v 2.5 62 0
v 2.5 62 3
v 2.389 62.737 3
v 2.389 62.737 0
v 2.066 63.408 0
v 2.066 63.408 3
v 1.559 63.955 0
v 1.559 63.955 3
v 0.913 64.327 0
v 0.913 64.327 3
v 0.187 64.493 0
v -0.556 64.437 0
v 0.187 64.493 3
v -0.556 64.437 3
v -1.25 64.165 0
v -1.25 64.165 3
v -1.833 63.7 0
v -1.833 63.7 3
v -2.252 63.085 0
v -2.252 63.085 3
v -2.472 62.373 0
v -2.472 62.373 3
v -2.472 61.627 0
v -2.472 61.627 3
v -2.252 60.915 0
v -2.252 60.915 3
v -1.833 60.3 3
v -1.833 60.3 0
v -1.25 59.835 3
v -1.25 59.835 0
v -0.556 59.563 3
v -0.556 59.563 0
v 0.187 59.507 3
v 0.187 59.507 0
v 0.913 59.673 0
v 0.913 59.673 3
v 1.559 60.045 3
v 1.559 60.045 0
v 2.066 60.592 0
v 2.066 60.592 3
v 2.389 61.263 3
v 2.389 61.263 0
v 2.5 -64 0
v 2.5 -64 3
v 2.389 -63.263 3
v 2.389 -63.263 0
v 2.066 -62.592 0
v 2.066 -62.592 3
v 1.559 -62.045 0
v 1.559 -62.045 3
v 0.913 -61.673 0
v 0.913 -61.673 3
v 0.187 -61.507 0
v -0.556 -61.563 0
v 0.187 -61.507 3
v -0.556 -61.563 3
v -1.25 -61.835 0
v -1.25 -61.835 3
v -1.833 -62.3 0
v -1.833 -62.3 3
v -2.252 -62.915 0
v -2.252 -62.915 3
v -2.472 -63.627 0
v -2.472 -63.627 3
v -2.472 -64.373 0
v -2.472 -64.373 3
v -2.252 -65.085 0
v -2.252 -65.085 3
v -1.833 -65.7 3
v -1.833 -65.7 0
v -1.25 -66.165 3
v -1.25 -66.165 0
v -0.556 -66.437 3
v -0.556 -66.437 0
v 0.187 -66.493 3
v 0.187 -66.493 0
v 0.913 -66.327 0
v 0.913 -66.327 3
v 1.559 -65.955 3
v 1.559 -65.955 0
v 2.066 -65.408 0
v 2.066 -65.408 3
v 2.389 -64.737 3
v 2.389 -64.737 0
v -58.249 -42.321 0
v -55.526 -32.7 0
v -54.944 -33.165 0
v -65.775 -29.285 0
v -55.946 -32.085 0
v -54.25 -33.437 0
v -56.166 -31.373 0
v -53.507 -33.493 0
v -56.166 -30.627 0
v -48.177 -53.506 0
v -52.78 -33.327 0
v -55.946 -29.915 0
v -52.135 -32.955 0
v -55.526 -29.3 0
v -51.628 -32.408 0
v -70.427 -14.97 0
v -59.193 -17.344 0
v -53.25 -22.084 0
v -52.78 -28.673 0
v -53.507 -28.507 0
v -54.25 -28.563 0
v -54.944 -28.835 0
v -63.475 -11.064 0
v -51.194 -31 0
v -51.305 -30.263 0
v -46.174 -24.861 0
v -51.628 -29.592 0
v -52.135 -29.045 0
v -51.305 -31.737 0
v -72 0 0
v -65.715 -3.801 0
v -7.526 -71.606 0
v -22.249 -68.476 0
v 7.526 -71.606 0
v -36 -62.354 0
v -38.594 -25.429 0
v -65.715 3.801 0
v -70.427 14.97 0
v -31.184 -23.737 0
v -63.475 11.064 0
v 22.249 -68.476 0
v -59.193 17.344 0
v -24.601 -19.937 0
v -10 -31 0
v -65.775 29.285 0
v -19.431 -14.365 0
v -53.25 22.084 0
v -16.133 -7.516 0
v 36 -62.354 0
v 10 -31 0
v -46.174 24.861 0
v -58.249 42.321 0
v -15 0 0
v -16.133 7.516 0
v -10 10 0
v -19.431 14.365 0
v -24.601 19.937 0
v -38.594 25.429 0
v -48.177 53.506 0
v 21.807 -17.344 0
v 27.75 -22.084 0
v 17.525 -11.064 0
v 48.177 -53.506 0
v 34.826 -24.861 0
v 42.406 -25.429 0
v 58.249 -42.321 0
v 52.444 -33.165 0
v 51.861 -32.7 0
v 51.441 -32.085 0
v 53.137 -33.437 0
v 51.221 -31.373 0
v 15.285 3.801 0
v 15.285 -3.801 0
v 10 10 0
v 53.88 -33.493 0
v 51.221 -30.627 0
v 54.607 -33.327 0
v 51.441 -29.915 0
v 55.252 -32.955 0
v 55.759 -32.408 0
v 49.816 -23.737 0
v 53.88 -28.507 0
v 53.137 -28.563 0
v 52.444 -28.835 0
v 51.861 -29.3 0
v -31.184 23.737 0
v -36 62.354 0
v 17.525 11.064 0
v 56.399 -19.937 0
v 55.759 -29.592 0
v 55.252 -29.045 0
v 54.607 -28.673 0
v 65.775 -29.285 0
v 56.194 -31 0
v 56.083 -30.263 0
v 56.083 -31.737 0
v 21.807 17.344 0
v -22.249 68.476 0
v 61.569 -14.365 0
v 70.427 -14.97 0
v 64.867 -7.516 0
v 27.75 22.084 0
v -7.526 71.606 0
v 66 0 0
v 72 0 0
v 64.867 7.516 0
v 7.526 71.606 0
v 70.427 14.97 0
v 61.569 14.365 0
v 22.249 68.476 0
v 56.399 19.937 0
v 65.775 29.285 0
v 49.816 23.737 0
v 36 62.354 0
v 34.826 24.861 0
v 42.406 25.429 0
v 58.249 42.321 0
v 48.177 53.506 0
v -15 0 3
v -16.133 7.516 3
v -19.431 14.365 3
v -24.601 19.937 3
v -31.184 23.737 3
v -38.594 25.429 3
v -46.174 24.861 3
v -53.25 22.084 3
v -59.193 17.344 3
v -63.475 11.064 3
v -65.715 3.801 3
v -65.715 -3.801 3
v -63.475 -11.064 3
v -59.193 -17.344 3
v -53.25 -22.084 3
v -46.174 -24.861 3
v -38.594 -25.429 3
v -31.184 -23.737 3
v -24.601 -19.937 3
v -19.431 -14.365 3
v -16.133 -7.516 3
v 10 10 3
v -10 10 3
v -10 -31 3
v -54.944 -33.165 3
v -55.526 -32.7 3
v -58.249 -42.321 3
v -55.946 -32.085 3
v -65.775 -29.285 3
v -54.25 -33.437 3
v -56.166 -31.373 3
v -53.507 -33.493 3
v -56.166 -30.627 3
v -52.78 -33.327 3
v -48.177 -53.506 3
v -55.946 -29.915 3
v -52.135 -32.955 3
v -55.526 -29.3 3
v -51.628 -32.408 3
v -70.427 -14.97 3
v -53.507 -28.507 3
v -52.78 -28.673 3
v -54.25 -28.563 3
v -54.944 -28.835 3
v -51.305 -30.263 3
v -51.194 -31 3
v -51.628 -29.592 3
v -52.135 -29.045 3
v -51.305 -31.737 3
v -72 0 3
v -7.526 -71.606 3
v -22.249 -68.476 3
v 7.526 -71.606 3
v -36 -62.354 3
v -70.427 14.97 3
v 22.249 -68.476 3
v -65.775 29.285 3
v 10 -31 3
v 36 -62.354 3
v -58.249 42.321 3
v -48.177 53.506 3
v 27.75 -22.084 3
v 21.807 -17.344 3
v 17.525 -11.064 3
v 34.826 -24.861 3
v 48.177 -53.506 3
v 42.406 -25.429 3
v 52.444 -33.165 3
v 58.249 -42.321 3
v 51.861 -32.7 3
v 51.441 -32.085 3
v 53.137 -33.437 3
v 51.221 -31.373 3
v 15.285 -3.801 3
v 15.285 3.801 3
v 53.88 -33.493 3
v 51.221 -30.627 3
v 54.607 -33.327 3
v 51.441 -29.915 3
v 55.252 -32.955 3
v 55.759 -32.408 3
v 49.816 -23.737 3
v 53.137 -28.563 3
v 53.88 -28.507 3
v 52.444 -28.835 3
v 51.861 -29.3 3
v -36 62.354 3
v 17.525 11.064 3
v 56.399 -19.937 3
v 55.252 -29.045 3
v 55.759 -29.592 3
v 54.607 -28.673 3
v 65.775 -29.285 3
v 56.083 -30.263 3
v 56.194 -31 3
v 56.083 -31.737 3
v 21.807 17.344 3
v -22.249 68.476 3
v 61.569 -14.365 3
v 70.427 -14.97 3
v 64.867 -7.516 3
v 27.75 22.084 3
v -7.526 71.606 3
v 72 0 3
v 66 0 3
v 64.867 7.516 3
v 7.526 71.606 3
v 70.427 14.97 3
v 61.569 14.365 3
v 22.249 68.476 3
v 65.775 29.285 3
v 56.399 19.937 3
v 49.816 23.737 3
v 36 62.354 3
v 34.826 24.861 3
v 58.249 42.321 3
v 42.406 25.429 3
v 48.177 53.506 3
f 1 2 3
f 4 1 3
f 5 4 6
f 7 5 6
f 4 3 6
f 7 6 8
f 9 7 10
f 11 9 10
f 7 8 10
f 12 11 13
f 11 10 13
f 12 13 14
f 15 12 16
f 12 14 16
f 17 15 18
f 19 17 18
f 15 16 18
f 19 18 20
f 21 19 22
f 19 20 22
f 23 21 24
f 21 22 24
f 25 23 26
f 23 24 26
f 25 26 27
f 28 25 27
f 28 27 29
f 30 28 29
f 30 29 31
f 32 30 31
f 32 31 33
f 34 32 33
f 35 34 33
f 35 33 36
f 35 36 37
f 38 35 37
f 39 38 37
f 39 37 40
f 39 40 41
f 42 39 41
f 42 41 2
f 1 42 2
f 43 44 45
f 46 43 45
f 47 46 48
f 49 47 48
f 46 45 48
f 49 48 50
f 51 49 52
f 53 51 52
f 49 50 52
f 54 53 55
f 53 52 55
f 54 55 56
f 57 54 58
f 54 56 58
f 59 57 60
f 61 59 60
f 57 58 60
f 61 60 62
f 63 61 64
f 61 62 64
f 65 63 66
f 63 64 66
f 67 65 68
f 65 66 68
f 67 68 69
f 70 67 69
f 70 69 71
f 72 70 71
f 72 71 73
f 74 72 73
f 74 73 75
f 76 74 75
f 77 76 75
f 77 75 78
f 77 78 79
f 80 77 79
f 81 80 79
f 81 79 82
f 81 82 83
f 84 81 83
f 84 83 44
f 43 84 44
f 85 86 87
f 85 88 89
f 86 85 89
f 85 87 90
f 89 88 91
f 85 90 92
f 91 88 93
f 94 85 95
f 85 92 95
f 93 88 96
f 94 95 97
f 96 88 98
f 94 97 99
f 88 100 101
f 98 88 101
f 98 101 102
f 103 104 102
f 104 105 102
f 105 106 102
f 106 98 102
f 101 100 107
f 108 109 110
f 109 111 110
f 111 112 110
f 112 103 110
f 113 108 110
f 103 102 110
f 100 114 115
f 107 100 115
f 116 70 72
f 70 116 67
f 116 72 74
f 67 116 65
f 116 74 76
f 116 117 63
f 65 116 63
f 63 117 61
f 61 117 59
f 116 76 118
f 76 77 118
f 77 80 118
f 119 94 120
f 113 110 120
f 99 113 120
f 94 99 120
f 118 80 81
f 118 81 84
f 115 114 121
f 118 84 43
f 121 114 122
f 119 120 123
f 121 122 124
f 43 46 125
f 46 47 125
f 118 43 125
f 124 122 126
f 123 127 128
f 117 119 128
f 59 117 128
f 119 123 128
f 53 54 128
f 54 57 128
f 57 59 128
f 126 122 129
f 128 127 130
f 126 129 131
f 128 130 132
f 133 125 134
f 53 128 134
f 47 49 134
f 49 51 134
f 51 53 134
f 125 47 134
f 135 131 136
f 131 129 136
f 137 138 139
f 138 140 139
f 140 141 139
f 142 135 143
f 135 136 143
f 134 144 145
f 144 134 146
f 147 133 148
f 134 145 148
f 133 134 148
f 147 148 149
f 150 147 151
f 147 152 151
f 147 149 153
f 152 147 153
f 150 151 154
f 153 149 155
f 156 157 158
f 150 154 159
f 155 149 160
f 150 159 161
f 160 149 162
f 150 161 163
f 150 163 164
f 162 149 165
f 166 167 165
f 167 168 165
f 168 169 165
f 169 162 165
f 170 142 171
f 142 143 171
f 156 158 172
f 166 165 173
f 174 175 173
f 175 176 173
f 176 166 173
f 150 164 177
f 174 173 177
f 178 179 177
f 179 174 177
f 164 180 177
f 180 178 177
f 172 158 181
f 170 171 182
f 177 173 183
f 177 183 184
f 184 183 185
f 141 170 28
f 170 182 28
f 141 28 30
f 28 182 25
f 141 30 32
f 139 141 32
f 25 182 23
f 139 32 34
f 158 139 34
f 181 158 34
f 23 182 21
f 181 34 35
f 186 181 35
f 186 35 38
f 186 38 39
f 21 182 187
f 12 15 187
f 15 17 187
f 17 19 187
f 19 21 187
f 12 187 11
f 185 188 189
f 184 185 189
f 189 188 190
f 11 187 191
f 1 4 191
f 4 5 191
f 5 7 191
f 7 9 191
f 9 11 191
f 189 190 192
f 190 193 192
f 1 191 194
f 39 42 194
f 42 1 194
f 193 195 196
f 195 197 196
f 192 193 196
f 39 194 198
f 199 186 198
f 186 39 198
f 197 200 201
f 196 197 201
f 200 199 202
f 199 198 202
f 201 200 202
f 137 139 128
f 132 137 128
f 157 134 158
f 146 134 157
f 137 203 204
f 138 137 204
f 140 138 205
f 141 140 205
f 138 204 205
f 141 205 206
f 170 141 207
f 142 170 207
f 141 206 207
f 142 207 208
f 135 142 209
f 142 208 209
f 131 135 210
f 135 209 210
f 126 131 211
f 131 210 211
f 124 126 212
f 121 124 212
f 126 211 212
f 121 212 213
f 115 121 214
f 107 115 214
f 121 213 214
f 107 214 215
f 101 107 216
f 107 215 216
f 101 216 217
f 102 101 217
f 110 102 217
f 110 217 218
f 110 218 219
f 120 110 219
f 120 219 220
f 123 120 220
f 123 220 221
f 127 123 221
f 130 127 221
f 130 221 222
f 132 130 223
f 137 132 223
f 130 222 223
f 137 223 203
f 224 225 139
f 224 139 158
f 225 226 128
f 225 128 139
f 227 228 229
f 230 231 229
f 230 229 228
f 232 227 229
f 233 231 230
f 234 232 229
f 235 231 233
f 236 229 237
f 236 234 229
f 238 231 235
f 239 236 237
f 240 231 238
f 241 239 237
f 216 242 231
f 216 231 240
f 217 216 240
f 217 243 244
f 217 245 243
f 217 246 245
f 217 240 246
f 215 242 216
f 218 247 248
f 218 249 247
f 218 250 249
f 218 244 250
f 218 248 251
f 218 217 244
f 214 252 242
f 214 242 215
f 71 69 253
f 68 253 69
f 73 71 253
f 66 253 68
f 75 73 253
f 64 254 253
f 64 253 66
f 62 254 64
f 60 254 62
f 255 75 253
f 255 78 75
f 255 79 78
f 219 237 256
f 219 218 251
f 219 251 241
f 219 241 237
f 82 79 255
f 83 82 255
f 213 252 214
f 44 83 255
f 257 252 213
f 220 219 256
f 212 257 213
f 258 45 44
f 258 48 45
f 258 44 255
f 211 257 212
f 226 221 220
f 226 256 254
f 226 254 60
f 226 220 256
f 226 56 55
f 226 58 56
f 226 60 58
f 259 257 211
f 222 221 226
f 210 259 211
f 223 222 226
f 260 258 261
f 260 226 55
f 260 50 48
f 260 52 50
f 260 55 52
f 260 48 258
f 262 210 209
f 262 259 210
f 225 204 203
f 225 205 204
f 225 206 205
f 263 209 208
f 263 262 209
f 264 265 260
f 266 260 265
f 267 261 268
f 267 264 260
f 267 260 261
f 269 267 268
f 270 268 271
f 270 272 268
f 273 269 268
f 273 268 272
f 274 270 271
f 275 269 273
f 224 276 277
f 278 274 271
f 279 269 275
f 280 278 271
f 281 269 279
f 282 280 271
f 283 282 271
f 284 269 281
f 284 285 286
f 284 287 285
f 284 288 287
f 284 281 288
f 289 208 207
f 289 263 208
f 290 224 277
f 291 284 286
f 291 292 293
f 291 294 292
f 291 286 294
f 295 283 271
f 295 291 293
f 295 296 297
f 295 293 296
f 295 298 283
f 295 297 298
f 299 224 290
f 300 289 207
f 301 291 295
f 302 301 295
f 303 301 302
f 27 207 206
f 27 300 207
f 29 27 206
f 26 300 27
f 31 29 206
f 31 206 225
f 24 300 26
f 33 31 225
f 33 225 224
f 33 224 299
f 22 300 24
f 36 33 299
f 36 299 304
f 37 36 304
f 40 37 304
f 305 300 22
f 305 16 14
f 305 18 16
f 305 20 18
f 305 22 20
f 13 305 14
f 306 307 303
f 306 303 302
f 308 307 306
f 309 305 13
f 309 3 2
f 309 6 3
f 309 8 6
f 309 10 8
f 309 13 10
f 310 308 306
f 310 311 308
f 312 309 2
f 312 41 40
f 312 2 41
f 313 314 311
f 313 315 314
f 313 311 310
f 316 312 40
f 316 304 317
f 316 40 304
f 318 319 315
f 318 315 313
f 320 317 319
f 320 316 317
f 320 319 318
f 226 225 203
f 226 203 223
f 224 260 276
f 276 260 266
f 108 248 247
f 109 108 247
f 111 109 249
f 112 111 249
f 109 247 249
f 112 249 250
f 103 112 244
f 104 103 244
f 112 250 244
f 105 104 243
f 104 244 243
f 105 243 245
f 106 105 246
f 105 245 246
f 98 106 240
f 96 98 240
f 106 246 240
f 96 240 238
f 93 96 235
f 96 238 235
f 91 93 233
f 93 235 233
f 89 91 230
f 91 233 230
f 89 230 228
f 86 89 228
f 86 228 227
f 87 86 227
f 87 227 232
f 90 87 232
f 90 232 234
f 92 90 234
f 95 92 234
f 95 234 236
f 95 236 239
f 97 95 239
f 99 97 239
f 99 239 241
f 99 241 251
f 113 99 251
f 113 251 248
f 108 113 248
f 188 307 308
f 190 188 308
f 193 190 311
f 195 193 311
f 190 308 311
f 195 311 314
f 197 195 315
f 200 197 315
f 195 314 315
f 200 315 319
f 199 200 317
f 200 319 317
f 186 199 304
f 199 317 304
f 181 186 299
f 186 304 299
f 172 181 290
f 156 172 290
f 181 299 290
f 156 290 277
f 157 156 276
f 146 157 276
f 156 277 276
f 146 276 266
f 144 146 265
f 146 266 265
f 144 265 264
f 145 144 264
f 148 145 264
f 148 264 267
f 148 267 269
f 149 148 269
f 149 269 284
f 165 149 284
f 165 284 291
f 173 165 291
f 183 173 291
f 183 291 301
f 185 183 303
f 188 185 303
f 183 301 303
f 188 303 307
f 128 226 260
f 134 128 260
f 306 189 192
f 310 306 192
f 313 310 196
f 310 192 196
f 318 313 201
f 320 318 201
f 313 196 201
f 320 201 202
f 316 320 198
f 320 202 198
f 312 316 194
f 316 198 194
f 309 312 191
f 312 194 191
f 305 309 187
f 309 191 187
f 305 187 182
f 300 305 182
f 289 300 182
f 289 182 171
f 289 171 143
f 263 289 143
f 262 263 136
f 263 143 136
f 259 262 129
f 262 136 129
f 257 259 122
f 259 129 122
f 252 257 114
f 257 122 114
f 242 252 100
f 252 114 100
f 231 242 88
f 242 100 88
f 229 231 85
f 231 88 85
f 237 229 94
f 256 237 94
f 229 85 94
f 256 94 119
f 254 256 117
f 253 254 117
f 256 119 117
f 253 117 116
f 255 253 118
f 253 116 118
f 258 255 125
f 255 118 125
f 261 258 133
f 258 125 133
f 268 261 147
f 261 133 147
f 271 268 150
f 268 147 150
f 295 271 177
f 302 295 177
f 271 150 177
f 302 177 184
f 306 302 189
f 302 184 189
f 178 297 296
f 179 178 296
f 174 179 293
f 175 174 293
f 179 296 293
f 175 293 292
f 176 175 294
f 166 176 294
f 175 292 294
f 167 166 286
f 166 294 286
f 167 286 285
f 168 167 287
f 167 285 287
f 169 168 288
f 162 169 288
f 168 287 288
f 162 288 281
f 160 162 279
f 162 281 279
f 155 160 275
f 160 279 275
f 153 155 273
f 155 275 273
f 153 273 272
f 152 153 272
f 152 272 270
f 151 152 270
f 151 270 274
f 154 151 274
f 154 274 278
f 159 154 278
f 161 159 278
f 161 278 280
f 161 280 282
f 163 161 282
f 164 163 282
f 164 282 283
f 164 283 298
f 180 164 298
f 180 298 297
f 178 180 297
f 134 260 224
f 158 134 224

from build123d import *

# Parameters (mm, degrees)
F0_R     = 72
F1_DEPTH = 3
F2_R     = 25.5
F3_DEPTH = 3
F4_R     = 2.5
F5_DEPTH = 25.4
F6_W     = 20
F6_H     = 41
F7_DEPTH = 3
F8_R     = 2.5
F9_DEPTH = 25.4


with BuildPart() as f1:
    # F0 (on Top) → F1 (new body)
    with BuildSketch(Plane.XY):
        Circle(F0_R)
    extrude(amount=F1_DEPTH)

    # F2 (on face) → F3 (cut)
    with BuildSketch(Plane.XY.offset(3)):
        with Locations((-40.5, 0)):
            Circle(F2_R)
        with Locations((40.5, 0)):
            Circle(F2_R)
    extrude(amount=-F3_DEPTH, mode=Mode.SUBTRACT)

    # F4 (on face) → F5 (cut)
    with BuildSketch(Plane.XY.offset(3)):
        with Locations((0, 62)):
            Circle(F4_R)
        Circle(F4_R)
        with Locations((0, -64)):
            Circle(F4_R)
    extrude(amount=-F5_DEPTH, mode=Mode.SUBTRACT)

    # F6 (on face) → F7 (cut)
    with BuildSketch(Plane.XY.offset(3)):
        with Locations((0, -10.5)):
            Rectangle(F6_W, F6_H)
    extrude(amount=-F7_DEPTH, mode=Mode.SUBTRACT)

    # F8 (on face) → F9 (cut)
    with BuildSketch(Plane.XY.offset(3)):
        with Locations((-53.693575, -31)):
            Circle(F8_R)
        with Locations((53.693575, -31)):
            Circle(F8_R)
    extrude(amount=-F9_DEPTH, mode=Mode.SUBTRACT)


solid = f1.part
